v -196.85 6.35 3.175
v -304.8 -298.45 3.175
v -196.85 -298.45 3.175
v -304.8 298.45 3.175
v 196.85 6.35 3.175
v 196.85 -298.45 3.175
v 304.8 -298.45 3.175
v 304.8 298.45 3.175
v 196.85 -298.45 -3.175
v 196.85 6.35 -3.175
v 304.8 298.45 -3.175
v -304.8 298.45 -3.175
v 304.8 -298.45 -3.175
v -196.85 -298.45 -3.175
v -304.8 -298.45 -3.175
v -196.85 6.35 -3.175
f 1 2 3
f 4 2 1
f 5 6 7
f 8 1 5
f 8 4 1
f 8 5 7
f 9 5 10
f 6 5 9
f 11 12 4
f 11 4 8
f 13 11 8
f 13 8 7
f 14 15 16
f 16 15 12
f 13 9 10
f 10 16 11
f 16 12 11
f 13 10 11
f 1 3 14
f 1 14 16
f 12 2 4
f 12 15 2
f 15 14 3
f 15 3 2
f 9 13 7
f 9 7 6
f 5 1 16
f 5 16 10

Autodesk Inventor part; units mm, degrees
ref_plane "YZ Plane" through (0, 0, 0) normal (1, 0, 0) x (0, 1, 0)
ref_plane "XZ Plane" through (0, 0, 0) normal (0, 1, 0) x (-1, 0, 0)
sketch "Sketch1" plane through (0, 0, 0) normal (0, 0, 1) x (1, 0, 0)
  line L0 (-426.72, 0) -> (426.72, 0) projected
  line L1 (0, -417.83) -> (0, 417.83) projected
  line L2 (-304.8, 298.45) -> (304.8, 298.45)
  line L3 (304.8, 298.45) -> (304.8, -298.45)
  line L4 (304.8, -298.45) -> (-304.8, -298.45)
  line L5 (-304.8, -298.45) -> (-304.8, 298.45)
  point P0 (0, 0)
  point P1 (-304.8, 0)
  point P2 (0, 298.45)
  dimension "d0" = 609.6
  dimension "d1" = 596.9
extrude "Base" add sketch "Sketch1" along normal mid plane 6.35
sketch "Sketch2" plane through (0, 0, 3.175) normal (0, 0, 1) x (1, 0, 0)
  line L0 (304.8, -298.45) -> (-304.8, -298.45) projected
  line L1 (-196.85, -298.45) -> (-196.85, 6.35)
  line L2 (-196.85, 6.35) -> (196.85, 6.35)
  line L3 (196.85, 6.35) -> (196.85, -298.45)
  point P0 (0, 0)
  point P1 (0, 6.35)
  dimension "d4" = 304.8
  dimension "d5" = 393.7
extrude "Extrusion2" cut sketch "Sketch2" against normal through all
ref_plane "Work Plane1" through (-304.8, 152.4, 3.175) normal (0, 1, 0) x (1, 0, 0)
properties part number "electrical board seal front" material "ABS Plastic"
